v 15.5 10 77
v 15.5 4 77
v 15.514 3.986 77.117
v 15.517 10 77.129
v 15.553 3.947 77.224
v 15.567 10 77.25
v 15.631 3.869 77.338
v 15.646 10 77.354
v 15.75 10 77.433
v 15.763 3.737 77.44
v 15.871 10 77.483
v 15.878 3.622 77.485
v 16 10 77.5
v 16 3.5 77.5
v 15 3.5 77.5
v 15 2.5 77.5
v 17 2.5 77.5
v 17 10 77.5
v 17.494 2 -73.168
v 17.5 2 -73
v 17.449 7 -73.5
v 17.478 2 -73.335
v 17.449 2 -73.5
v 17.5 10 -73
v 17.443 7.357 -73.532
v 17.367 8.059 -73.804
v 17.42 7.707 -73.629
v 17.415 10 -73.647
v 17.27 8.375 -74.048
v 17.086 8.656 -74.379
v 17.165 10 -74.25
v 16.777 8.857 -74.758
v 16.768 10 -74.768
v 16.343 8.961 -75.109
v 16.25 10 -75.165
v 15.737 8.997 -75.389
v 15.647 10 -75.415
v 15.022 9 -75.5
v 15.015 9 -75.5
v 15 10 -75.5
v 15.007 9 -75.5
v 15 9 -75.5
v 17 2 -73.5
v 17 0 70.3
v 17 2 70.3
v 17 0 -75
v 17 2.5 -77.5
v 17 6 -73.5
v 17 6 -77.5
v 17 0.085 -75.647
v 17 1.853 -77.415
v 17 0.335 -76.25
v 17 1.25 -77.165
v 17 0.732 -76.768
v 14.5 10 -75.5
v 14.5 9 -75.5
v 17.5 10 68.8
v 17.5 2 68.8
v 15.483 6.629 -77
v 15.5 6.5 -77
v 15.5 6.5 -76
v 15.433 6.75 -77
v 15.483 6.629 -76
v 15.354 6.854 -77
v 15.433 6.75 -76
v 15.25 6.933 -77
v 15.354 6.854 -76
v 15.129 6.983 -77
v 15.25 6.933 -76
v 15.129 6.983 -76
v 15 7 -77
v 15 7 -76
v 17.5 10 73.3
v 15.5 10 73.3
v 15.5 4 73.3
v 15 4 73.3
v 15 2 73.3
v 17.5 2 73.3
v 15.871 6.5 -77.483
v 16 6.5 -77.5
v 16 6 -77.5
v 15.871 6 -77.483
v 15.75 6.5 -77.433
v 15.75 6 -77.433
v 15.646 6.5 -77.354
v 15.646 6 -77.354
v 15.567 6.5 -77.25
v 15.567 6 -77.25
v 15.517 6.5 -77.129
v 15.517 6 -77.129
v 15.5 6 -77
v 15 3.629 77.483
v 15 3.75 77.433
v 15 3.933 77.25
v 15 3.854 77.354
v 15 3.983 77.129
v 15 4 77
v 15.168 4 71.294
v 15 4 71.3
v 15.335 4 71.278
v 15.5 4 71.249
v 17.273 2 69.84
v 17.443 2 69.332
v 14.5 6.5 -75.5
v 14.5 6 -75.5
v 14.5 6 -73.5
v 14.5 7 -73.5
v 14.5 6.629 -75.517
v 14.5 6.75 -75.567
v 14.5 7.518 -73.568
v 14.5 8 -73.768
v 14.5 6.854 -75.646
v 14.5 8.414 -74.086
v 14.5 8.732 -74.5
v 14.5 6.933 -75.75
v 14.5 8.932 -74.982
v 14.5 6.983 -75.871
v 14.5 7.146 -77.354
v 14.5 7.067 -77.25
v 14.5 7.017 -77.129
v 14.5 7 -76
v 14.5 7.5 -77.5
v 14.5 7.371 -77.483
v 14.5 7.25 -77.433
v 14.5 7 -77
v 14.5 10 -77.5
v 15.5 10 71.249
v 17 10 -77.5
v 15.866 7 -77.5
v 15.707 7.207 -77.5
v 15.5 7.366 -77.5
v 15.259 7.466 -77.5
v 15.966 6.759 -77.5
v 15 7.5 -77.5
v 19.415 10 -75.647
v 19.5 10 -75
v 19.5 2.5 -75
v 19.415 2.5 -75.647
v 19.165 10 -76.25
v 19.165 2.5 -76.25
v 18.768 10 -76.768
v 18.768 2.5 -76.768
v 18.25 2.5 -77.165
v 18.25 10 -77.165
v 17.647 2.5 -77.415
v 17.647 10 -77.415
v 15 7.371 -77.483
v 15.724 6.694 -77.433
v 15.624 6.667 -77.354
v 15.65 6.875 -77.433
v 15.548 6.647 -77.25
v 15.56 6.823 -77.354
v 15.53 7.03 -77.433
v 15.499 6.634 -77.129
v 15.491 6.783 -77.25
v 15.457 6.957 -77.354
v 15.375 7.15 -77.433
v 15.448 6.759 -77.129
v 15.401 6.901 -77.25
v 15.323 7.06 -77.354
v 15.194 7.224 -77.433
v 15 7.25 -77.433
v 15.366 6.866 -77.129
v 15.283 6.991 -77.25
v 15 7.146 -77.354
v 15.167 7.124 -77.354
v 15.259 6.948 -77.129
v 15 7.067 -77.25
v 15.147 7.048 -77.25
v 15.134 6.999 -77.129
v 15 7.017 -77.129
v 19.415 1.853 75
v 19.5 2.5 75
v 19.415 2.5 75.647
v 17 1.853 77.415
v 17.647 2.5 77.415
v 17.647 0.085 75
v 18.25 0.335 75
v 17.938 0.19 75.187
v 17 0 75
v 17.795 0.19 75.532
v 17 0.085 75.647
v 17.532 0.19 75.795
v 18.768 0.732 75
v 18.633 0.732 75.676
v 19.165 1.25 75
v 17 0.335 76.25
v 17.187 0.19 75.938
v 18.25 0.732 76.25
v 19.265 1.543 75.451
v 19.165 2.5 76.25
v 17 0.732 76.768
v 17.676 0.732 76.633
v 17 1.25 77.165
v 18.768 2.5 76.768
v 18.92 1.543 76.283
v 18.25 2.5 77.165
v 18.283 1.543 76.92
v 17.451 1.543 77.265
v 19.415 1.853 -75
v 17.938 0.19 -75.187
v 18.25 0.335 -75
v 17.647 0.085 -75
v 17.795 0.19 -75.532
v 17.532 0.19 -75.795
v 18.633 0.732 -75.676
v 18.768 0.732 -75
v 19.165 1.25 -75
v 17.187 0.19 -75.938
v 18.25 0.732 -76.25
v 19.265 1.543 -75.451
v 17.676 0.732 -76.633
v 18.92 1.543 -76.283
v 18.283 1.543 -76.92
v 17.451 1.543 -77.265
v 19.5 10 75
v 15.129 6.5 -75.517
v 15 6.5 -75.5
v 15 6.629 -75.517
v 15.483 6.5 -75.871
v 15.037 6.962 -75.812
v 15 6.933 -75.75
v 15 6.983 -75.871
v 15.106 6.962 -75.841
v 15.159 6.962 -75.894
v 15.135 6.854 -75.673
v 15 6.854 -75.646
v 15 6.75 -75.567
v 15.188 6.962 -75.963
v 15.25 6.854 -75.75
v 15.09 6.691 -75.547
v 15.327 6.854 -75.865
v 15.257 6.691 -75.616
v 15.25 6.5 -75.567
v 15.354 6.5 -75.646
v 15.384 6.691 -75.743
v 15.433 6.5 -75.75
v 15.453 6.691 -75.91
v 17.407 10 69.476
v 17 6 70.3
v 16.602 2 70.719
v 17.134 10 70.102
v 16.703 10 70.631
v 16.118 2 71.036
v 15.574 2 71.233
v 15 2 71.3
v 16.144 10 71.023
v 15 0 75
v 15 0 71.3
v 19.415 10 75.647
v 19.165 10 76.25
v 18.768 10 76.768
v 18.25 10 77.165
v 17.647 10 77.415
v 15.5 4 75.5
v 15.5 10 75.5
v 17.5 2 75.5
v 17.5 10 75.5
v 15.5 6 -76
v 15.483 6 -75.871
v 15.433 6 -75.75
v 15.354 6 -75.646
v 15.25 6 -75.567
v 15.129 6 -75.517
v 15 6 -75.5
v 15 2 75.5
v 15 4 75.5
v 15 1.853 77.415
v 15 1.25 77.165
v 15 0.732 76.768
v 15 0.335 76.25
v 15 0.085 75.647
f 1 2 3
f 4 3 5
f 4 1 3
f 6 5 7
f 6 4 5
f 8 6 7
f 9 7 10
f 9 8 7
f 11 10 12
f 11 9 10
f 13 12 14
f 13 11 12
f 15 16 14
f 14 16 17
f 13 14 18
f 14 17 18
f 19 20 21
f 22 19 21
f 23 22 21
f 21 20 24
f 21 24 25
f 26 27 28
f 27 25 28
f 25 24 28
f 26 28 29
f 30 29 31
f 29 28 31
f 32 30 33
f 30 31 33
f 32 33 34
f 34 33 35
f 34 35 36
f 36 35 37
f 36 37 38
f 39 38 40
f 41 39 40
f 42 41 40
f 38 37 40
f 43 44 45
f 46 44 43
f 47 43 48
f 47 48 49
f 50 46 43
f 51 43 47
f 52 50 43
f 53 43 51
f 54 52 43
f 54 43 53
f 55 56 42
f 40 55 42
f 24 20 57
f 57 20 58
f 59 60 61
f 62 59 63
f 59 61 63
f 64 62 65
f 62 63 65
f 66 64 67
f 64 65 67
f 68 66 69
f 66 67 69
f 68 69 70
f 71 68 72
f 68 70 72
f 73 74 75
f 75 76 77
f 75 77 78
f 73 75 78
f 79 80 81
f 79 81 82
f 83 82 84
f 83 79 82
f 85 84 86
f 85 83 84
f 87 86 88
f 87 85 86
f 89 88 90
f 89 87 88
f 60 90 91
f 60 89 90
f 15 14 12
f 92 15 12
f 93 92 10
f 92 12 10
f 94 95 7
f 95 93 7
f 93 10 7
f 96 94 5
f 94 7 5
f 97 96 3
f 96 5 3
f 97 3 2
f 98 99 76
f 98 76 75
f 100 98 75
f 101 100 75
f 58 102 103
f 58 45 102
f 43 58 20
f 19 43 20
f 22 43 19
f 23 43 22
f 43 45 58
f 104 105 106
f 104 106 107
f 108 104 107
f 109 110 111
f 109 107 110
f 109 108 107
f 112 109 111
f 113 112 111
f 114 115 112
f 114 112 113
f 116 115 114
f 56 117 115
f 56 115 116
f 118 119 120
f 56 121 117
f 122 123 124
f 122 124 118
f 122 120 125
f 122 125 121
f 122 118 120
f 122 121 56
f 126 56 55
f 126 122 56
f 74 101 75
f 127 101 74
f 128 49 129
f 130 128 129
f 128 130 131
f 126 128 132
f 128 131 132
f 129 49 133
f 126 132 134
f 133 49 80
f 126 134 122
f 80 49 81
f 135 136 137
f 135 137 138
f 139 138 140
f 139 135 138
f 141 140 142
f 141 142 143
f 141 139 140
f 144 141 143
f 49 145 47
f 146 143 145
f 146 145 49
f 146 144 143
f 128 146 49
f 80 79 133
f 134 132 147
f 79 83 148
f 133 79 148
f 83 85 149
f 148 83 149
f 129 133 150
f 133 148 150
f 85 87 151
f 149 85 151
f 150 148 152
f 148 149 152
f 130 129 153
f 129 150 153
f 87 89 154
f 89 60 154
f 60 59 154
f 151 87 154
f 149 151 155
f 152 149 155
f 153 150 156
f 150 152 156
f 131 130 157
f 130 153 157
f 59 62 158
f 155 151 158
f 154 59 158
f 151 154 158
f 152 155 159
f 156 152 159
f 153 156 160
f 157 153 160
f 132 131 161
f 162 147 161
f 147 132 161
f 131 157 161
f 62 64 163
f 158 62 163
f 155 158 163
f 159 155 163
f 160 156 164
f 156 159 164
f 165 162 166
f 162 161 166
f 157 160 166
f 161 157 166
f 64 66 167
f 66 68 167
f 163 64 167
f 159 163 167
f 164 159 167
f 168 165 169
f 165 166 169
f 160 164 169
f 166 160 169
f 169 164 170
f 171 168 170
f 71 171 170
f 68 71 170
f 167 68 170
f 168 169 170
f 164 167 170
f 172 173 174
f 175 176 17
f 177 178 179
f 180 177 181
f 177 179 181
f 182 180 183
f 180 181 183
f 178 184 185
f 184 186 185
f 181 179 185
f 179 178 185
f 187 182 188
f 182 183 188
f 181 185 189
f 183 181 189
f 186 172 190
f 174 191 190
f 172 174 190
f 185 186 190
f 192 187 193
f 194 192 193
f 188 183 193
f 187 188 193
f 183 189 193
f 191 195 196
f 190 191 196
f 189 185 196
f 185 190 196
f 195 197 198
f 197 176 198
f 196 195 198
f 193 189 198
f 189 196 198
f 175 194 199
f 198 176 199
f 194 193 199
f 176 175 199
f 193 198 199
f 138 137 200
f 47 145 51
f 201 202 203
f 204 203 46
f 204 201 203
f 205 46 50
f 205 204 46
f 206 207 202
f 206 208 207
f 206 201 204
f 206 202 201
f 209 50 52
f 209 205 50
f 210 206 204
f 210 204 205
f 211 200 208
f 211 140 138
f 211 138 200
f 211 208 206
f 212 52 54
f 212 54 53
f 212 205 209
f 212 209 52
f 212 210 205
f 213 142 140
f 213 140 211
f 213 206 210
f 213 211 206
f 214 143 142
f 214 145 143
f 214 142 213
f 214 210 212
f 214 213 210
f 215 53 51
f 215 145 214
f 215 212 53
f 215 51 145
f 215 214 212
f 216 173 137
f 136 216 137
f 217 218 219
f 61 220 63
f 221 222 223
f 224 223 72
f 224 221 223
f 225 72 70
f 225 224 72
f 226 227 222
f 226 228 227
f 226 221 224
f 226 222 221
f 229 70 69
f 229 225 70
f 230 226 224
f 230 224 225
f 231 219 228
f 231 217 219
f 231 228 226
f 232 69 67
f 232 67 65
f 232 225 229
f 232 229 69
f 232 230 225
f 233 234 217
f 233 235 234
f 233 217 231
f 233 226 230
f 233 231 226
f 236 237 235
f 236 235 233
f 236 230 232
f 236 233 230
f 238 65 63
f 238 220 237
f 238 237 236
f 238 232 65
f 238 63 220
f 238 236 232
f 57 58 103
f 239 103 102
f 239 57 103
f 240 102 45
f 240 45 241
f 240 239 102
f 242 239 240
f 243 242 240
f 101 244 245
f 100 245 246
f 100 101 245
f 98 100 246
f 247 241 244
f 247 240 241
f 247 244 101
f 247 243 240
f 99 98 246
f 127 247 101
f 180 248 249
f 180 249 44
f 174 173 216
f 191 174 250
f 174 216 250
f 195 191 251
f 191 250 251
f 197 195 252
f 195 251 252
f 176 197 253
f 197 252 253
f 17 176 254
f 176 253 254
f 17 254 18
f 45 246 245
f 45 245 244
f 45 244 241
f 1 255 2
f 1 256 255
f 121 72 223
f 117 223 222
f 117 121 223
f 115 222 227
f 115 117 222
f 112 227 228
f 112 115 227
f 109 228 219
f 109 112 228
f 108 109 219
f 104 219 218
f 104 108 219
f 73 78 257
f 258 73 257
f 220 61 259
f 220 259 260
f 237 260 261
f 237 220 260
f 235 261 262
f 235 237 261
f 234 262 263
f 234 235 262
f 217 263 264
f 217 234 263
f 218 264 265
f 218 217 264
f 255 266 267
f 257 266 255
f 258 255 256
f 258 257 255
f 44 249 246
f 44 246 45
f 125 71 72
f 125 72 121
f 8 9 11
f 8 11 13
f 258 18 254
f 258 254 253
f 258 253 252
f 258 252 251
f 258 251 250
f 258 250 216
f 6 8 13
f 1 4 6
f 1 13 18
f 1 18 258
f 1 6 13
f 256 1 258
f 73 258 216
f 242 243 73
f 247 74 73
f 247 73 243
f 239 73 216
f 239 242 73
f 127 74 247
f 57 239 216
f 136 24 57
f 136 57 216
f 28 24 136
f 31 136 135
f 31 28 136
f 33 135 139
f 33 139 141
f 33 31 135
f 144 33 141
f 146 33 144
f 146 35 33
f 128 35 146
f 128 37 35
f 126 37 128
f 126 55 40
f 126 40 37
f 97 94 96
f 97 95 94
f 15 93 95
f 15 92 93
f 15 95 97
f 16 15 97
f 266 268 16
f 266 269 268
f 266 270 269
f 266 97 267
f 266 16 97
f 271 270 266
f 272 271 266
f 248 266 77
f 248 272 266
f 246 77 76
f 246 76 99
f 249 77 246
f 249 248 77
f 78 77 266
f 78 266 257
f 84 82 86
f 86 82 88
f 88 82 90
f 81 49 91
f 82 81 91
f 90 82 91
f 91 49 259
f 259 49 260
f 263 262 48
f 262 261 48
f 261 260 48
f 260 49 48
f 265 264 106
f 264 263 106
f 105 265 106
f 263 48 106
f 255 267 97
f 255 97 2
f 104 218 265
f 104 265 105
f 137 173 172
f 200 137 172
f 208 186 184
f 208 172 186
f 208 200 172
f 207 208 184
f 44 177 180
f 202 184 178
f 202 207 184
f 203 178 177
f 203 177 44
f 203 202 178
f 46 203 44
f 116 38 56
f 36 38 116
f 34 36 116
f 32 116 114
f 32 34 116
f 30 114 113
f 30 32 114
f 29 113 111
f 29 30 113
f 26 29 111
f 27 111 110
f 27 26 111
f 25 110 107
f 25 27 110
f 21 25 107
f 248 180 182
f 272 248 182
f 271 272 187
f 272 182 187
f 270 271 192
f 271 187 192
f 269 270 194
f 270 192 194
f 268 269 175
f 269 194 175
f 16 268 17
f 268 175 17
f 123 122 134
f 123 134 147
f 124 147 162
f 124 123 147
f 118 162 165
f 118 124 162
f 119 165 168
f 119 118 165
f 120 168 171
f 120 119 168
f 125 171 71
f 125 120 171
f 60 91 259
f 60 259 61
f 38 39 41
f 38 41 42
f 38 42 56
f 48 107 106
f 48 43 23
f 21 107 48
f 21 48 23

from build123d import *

# Parameters (mm, degrees)
SKETCH1_W                       = 39
SKETCH1_H                       = 155
BOSS_EXTRUDE1_DEPTH             = 2
BOSS_EXTRUDE2_DEPTH             = 38
SKETCH3_W                       = 2
SKETCH3_H                       = 2
BOSS_EXTRUDE3_DEPTH             = 38
SKETCH4_W                       = 2
SKETCH4_H                       = 2
BOSS_EXTRUDE4_DEPTH             = 151
SKETCH6_W                       = 35
SKETCH6_H                       = 2.2
CUT_EXTRUDE1_DEPTH              = 160.340045186
SKETCH7_W                       = 35
SKETCH7_H                       = 2.2
CUT_EXTRUDE2_DEPTH              = 89.490112442
SKETCH5_W                       = 31
SKETCH5_H                       = 2
BOSS_EXTRUDE5_DEPTH             = 2
BOSS_EXTRUDE6_REACH             = 91.367
SKETCH8_W                       = 2
SKETCH8_H                       = 2
BOSS_EXTRUDE6_DIRECTION_2_REACH = 91.367
SKETCH10_W                      = 2
SKETCH10_H                      = 2.2
SKETCH10_W_2                    = 2.2
SKETCH10_H_2                    = 2
BOSS_EXTRUDE8_DEPTH             = 2
SKETCH11_W                      = 2
SKETCH11_H                      = 2.2
SKETCH11_W_2                    = 2.2
SKETCH11_H_2                    = 2
BOSS_EXTRUDE9_DEPTH             = 2
FILLET2_R                       = 2.5
SKETCH14_W                      = 36.5
SKETCH14_H                      = 7.75
BOSS_EXTRUDE10_DEPTH            = 2
SKETCH13_W                      = 31
SKETCH13_H                      = 3
CUT_EXTRUDE4_DEPTH              = 2
FILLET3_R                       = 2
FILLET4_R                       = 0.5
SKETCH15_R                      = 5.1
CUT_EXTRUDE5_DEPTH              = 90.367219941
SKETCH16_R                      = 7.1
BOSS_EXTRUDE11_DEPTH            = 1
FILLET5_R                       = 0.5
CUT_EXTRUDE3_DEPTH              = 160.340045186
FILLET6_R                       = 0.4
FILLET7_R                       = 0.5
CUT_EXTRUDE6_DEPTH              = 6
SKETCH18_W                      = 29
SKETCH18_H                      = 3
CUT_EXTRUDE8_DEPTH              = 90.367220028
CUT_EXTRUDE11_DEPTH             = 90.367220028
CUT_EXTRUDE11_DEPTH_BACK        = 90.367220028
SKETCH20_W                      = 29
SKETCH20_H                      = 34
SKETCH21_W                      = 155
SKETCH21_H                      = 20
SKETCH21_H_2                    = 10
CUT_EXTRUDE12_DEPTH             = 90.367219941


with BuildPart() as part:
    # Sketch1 → Boss-Extrude1 (new body)
    with BuildSketch(Plane(origin=(0, 0, 0), x_dir=(1, 0, 0), z_dir=(0, 1, 0))):
        Rectangle(SKETCH1_W, SKETCH1_H)
    extrude(amount=BOSS_EXTRUDE1_DEPTH)

    # Sketch2 → Boss-Extrude2 (add)
    with BuildSketch(Plane(origin=(0, 2, 0), x_dir=(1, 0, 0), z_dir=(0, 1, 0))):
        Polygon((-17.5, -77.5), (-17.5, -75.5), (-17.5, 75.5), (17.5, 75.5), (17.5, -75.5), (17.5, -77.5), (19.5, -77.5), (19.5, 77.5), (-19.5, 77.5), (-19.5, -77.5), align=None)
    extrude(amount=BOSS_EXTRUDE2_DEPTH)

    # Sketch3 → Boss-Extrude3 (add)
    with BuildSketch(Plane(origin=(0, 2, 0), x_dir=(1, 0, 0), z_dir=(0, 1, 0))):
        with Locations((-16.5, -76.5)):
            Rectangle(SKETCH3_W, SKETCH3_H)
        with Locations((-16.5, -72.3)):
            Rectangle(SKETCH3_W, SKETCH3_H)
        with Locations((16.5, -76.5)):
            Rectangle(SKETCH3_W, SKETCH3_H)
        with Locations((16.5, -72.3)):
            Rectangle(SKETCH3_W, SKETCH3_H)
    extrude(amount=BOSS_EXTRUDE3_DEPTH)

    # Sketch4 → Boss-Extrude4 (add)
    with BuildSketch(Plane.XY.offset(-75.5)):
        with Locations((-16.5, 39)):
            Rectangle(SKETCH4_W, SKETCH4_H)
        Polygon((-15.5, 33.8), (-17.5, 31.8), (-17.5, 35.8), (-15.5, 35.8), align=None)
        Polygon((15.5, 35.8), (17.5, 35.8), (17.5, 31.8), (15.5, 33.8), align=None)
        with Locations((16.5, 39)):
            Rectangle(SKETCH4_W, SKETCH4_H)
    extrude(amount=BOSS_EXTRUDE4_DEPTH)

    # Sketch6 → Cut-Extrude1 (cut, through all)
    with BuildSketch(Plane.XY.offset(-75.5)):
        with Locations((0, 36.9)):
            Rectangle(SKETCH6_W, SKETCH6_H)
    extrude(amount=CUT_EXTRUDE1_DEPTH, mode=Mode.SUBTRACT)

    # Sketch7 → Cut-Extrude2 (cut, through all)
    with BuildSketch(Plane(origin=(0, 2, 0), x_dir=(1, 0, 0), z_dir=(0, 1, 0))):
        with Locations((0, -74.4)):
            Rectangle(SKETCH7_W, SKETCH7_H)
    extrude(amount=CUT_EXTRUDE2_DEPTH, mode=Mode.SUBTRACT)

    # Sketch5 → Boss-Extrude5 (add)
    with BuildSketch(Plane(origin=(0, 2, 0), x_dir=(1, 0, 0), z_dir=(0, 1, 0))):
        with Locations((0, -76.5)):
            Rectangle(SKETCH5_W, SKETCH5_H)
        with Locations((0, -72.3)):
            Rectangle(SKETCH5_W, SKETCH5_H)
    extrude(amount=BOSS_EXTRUDE5_DEPTH)

    # Boss-Extrude6: up to this face of the body (flat: up to its plane)
    boss_extrude6_end = Plane(part.part.faces().sort_by_distance((17.5, 16.9, -2.1))[0])
    # Sketch8 → Boss-Extrude6 (add, up to the picked face)
    with BuildSketch(Plane(origin=(0, 0, 0), x_dir=(0, 0, -1), z_dir=(1, 0, 0)), mode=Mode.PRIVATE) as boss_extrude6_sk1:
        with Locations((74.5, 39)):
            Rectangle(SKETCH8_W, SKETCH8_H)
    boss_extrude6_tool1 = split(extrude(boss_extrude6_sk1.sketch, amount=BOSS_EXTRUDE6_REACH, mode=Mode.PRIVATE), bisect_by=boss_extrude6_end, keep=Keep.BOTH, mode=Mode.PRIVATE)
    # Sketch8 → Boss-Extrude6 (add, up to the picked face)
    with BuildSketch(Plane(origin=(0, 0, 0), x_dir=(0, 0, -1), z_dir=(1, 0, 0)), mode=Mode.PRIVATE) as boss_extrude6_sk2:
        Polygon((75.5, 35.8), (73.5, 35.8), (73.5, 33.8), (75.5, 31.8), align=None)
    boss_extrude6_tool2 = split(extrude(boss_extrude6_sk2.sketch, amount=BOSS_EXTRUDE6_REACH, mode=Mode.PRIVATE), bisect_by=boss_extrude6_end, keep=Keep.BOTH, mode=Mode.PRIVATE)
    add(boss_extrude6_tool1.solids().sort_by(Axis((0, 39, -74.5), (1, 0, 0)))[0])
    add(boss_extrude6_tool2.solids().sort_by(Axis((0, 34.244444, -74.611111), (1, 0, 0)))[0])

    # Boss-Extrude6 direction 2: up to this face of the body (flat: up to its plane)
    boss_extrude6_direction_2_end = Plane(part.part.faces().sort_by_distance((-17.5, 16.9, -2.1))[0])
    # Sketch8 → Boss-Extrude6 direction 2 (add, up to the picked face)
    with BuildSketch(Plane(origin=(0, 0, 0), x_dir=(0, 0, -1), z_dir=(1, 0, 0)), mode=Mode.PRIVATE) as boss_extrude6_direction_2_sk1:
        with Locations((74.5, 39)):
            Rectangle(SKETCH8_W, SKETCH8_H)
    boss_extrude6_direction_2_tool1 = split(extrude(boss_extrude6_direction_2_sk1.sketch, amount=-BOSS_EXTRUDE6_DIRECTION_2_REACH, mode=Mode.PRIVATE), bisect_by=boss_extrude6_direction_2_end, keep=Keep.BOTH, mode=Mode.PRIVATE)
    # Sketch8 → Boss-Extrude6 direction 2 (add, up to the picked face)
    with BuildSketch(Plane(origin=(0, 0, 0), x_dir=(0, 0, -1), z_dir=(1, 0, 0)), mode=Mode.PRIVATE) as boss_extrude6_direction_2_sk2:
        Polygon((75.5, 35.8), (73.5, 35.8), (73.5, 33.8), (75.5, 31.8), align=None)
    boss_extrude6_direction_2_tool2 = split(extrude(boss_extrude6_direction_2_sk2.sketch, amount=-BOSS_EXTRUDE6_DIRECTION_2_REACH, mode=Mode.PRIVATE), bisect_by=boss_extrude6_direction_2_end, keep=Keep.BOTH, mode=Mode.PRIVATE)
    add(boss_extrude6_direction_2_tool1.solids().sort_by(Axis((0, 39, -74.5), (-1, 0, 0)))[0])
    add(boss_extrude6_direction_2_tool2.solids().sort_by(Axis((0, 34.244444, -74.611111), (-1, 0, 0)))[0])

    # Sketch10 → Boss-Extrude8 (add)
    with BuildSketch(Plane(origin=(-17.5, 0, 0), x_dir=(0, 0, -1), z_dir=(1, 0, 0))):
        with Locations((-76.5, 36.9)):
            Rectangle(SKETCH10_W, SKETCH10_H)
        with Locations((-74.4, 39)):
            Rectangle(SKETCH10_W_2, SKETCH10_H_2)
    extrude(amount=BOSS_EXTRUDE8_DEPTH)

    # Sketch11 → Boss-Extrude9 (add)
    with BuildSketch(Plane.ZY.offset(-17.5)):
        with Locations((76.5, 36.9)):
            Rectangle(SKETCH11_W, SKETCH11_H)
        with Locations((74.4, 39)):
            Rectangle(SKETCH11_W_2, SKETCH11_H_2)
    extrude(amount=BOSS_EXTRUDE9_DEPTH)

    # Fillet2
    fillet2_edges = [part.edges().sort_by_distance(p)[0] for p in [
        (-17.5, 16.9, 71.3),
        (17.5, 16.9, 71.3),
        (19.5, 20, 77.5),
        (-19.5, 20, 77.5),
        (-19.5, 20, -77.5),
        (-17.5, 16.9, -75.5),
        (17.5, 16.9, -75.5),
        (19.5, 20, -77.5),
        (19.5, 40, 0),
        (-19.5, 40, 0),
        (19.5, 0, 0),
        (-19.5, 0, 0),
        (0, 40, -77.5),
        (0, 0, 77.5),
        (0, 0, -77.5),
        (-17.5, 40, 77.5),
        (17.5, 40, 77.5),
    ]]
    fillet(fillet2_edges, radius=FILLET2_R)

    # Sketch14 → Boss-Extrude10 (add)
    with BuildSketch(Plane.XY.offset(-75.5)):
        with Locations((0, 5.125)):
            Rectangle(SKETCH14_W, SKETCH14_H)
    extrude(amount=BOSS_EXTRUDE10_DEPTH)

    # Sketch13 → Cut-Extrude4 (cut)
    with BuildSketch(Plane(origin=(0, 0, -77.5), x_dir=(-1, 0, 0), z_dir=(0, 0, -1))):
        with Locations((0, 5.5)):
            Rectangle(SKETCH13_W, SKETCH13_H)
    extrude(amount=-CUT_EXTRUDE4_DEPTH, mode=Mode.SUBTRACT)

    # Fillet3
    fillet3_edges = [part.edges().sort_by_distance(p)[0] for p in [
        (0, 9, -73.5),
    ]]
    fillet(fillet3_edges, radius=FILLET3_R - 0.0001)  # a hair under: the kernel refuses the full size

    # Fillet4
    fillet4_edges = [part.edges().sort_by_distance(p)[0] for p in [
        (15.5, 5.5, -75.5),
        (15.5, 4, -76.5),
        (0, 7, -75.5),
        (15.5, 7, -76.5),
        (-15.5, 5.5, -75.5),
        (-15.5, 7, -76.5),
        (0, 4, -75.5),
        (-15.5, 4, -76.5),
        (15.5, 5.5, -77.5),
        (0, 4, -77.5),
        (-15.5, 5.5, -77.5),
        (0, 7, -77.5),
    ]]
    fillet(fillet4_edges, radius=FILLET4_R)

    # Sketch15 → Cut-Extrude5 (cut, through all)
    with BuildSketch(Plane.XZ):
        with Locations(Location((0, 38.75, 0), (0, 0, 270))):
            Circle(SKETCH15_R)
        with Locations(Location((0, -38.75, 0), (0, 0, 270))):
            Circle(SKETCH15_R)
    extrude(amount=-CUT_EXTRUDE5_DEPTH, mode=Mode.SUBTRACT)

    # Sketch16 → Boss-Extrude11 (add)
    with BuildSketch(Plane(origin=(0, 2, 0), x_dir=(1, 0, 0), z_dir=(0, 1, 0))):
        with Locations(Location((0, 38.75, 0), (0, 0, 270))):
            Circle(SKETCH16_R)
        with Locations(Location((0, -38.75, 0), (0, 0, 270))):
            Circle(SKETCH16_R)
    extrude(amount=BOSS_EXTRUDE11_DEPTH)

    # Fillet5
    fillet5_edges = [part.edges().sort_by_distance(p)[0] for p in [
        (0, 2, -45.85),
        (0, 3, -45.85),
        (0, 2, 31.65),
        (0, 3, 31.65),
    ]]
    fillet(fillet5_edges, radius=FILLET5_R - 0.0001)  # a hair under: the kernel refuses the full size

    # Sketch12 → Cut-Extrude3 (cut, through all)
    with BuildSketch(Plane.XY.offset(-75.5)):
        with BuildLine():
            Line((1.668907005, 12.688040659), (2.22520934, 10.250720878))
            ThreePointArc((2.22520934, 10.250720878), (4.338837391, 10.990311321), (6.234898019, 12.181685175))
            Line((6.234898019, 12.181685175), (4.676173514, 14.136263881))
            ThreePointArc((4.676173514, 14.136263881), (3.254128043, 13.242733491), (1.668907005, 12.688040659))
        make_face()
        with BuildLine():
            ThreePointArc((-6.234898019, 12.181685175), (-4.338837391, 10.990311321), (-2.22520934, 10.250720878))
            Line((-2.22520934, 10.250720878), (-1.668907005, 12.688040659))
            ThreePointArc((-1.668907005, 12.688040659), (-3.254128043, 13.242733491), (-4.676173514, 14.136263881))
            Line((-4.676173514, 14.136263881), (-6.234898019, 12.181685175))
        make_face()
        with BuildLine():
            ThreePointArc((-10, 20), (-9.749279122, 17.77479066), (-9.009688679, 15.661162609))
            Line((-9.009688679, 15.661162609), (-6.757266509, 16.745871957))
            ThreePointArc((-6.757266509, 16.745871957), (-7.311959341, 18.331092995), (-7.5, 20))
            Line((-7.5, 20), (-10, 20))
        make_face()
        with BuildLine():
            ThreePointArc((-6.234898019, 27.818314825), (-7.818314825, 26.234898019), (-9.009688679, 24.338837391))
            Line((-9.009688679, 24.338837391), (-6.757266509, 23.254128043))
            ThreePointArc((-6.757266509, 23.254128043), (-5.863736119, 24.676173514), (-4.676173514, 25.863736119))
            Line((-4.676173514, 25.863736119), (-6.234898019, 27.818314825))
        make_face()
        with BuildLine():
            ThreePointArc((-1.668907005, 27.311959341), (-0.839733571, 27.452841574), (0, 27.5))
            Line((0, 27.5), (0, 30))
            ThreePointArc((0, 30), (-1.119644761, 29.937122099), (-2.22520934, 29.749279122))
            Line((-2.22520934, 29.749279122), (-1.668907005, 27.311959341))
        make_face()
        with BuildLine():
            Line((0, 30), (0, 27.5))
            ThreePointArc((0, 27.5), (0.839733571, 27.452841574), (1.668907005, 27.311959341))
            Line((1.668907005, 27.311959341), (2.22520934, 29.749279122))
            ThreePointArc((2.22520934, 29.749279122), (1.119644761, 29.937122099), (0, 30))
        make_face()
        with BuildLine():
            Line((6.757266509, 23.254128043), (9.009688679, 24.338837391))
            ThreePointArc((9.009688679, 24.338837391), (7.818314825, 26.234898019), (6.234898019, 27.818314825))
            Line((6.234898019, 27.818314825), (4.676173514, 25.863736119))
            ThreePointArc((4.676173514, 25.863736119), (5.863736119, 24.676173514), (6.757266509, 23.254128043))
        make_face()
        with BuildLine():
            Line((6.757266509, 16.745871957), (9.009688679, 15.661162609))
            ThreePointArc((9.009688679, 15.661162609), (9.749279122, 17.77479066), (10, 20))
            Line((10, 20), (7.5, 20))
            ThreePointArc((7.5, 20), (7.311959341, 18.331092995), (6.757266509, 16.745871957))
        make_face()
        with BuildLine():
            ThreePointArc((2.5, 20), (2.43731978, 19.443697665), (2.25242217, 18.915290652))
            Line((2.25242217, 18.915290652), (4.50484434, 17.830581304))
            ThreePointArc((4.50484434, 17.830581304), (4.874639561, 18.88739533), (5, 20))
            Line((5, 20), (2.5, 20))
        make_face()
        with BuildLine():
            ThreePointArc((1.558724505, 21.954578706), (1.954578706, 21.558724505), (2.25242217, 21.084709348))
            Line((2.25242217, 21.084709348), (4.50484434, 22.169418696))
            ThreePointArc((4.50484434, 22.169418696), (3.909157412, 23.117449009), (3.117449009, 23.909157412))
            Line((3.117449009, 23.909157412), (1.558724505, 21.954578706))
        make_face()
        with BuildLine():
            Line((0, 25), (0, 22.5))
            ThreePointArc((0, 22.5), (0.27991119, 22.484280525), (0.556302335, 22.43731978))
            Line((0.556302335, 22.43731978), (1.11260467, 24.874639561))
            ThreePointArc((1.11260467, 24.874639561), (0.559822381, 24.968561049), (0, 25))
        make_face()
        with BuildLine():
            ThreePointArc((-0.556302335, 22.43731978), (-0.27991119, 22.484280525), (0, 22.5))
            Line((0, 22.5), (0, 25))
            ThreePointArc((0, 25), (-0.559822381, 24.968561049), (-1.11260467, 24.874639561))
            Line((-1.11260467, 24.874639561), (-0.556302335, 22.43731978))
        make_face()
        with BuildLine():
            ThreePointArc((-2.25242217, 21.084709348), (-1.954578706, 21.558724505), (-1.558724505, 21.954578706))
            Line((-1.558724505, 21.954578706), (-3.117449009, 23.909157412))
            ThreePointArc((-3.117449009, 23.909157412), (-3.909157412, 23.117449009), (-4.50484434, 22.169418696))
            Line((-4.50484434, 22.169418696), (-2.25242217, 21.084709348))
        make_face()
        with BuildLine():
            ThreePointArc((-2.25242217, 18.915290652), (-2.43731978, 19.443697665), (-2.5, 20))
            Line((-2.5, 20), (-5, 20))
            ThreePointArc((-5, 20), (-4.874639561, 18.88739533), (-4.50484434, 17.830581304))
            Line((-4.50484434, 17.830581304), (-2.25242217, 18.915290652))
        make_face()
        with BuildLine():
            ThreePointArc((-3.117449009, 16.090842588), (-2.169418696, 15.49515566), (-1.11260467, 15.125360439))
            Line((-1.11260467, 15.125360439), (-0.556302335, 17.56268022))
            ThreePointArc((-0.556302335, 17.56268022), (-1.084709348, 17.74757783), (-1.558724505, 18.045421294))
            Line((-1.558724505, 18.045421294), (-3.117449009, 16.090842588))
        make_face()
        with BuildLine():
            Line((0.556302335, 17.56268022), (1.11260467, 15.125360439))
            ThreePointArc((1.11260467, 15.125360439), (2.169418696, 15.49515566), (3.117449009, 16.090842588))
            Line((3.117449009, 16.090842588), (1.558724505, 18.045421294))
            ThreePointArc((1.558724505, 18.045421294), (1.084709348, 17.74757783), (0.556302335, 17.56268022))
        make_face()
    extrude(amount=-CUT_EXTRUDE3_DEPTH, mode=Mode.SUBTRACT)

    # Fillet6
    fillet6_edges = [part.edges().sort_by_distance(p)[0] for p in [
        (5.863736119, 24.676173514, -75.5),
        (5.455535766, 26.841025472, -75.5),
        (7.818314825, 26.234898019, -77.5),
        (7.883477594, 23.796482717, -77.5),
        (5.863736119, 24.676173514, -77.5),
        (5.455535766, 26.841025472, -77.5),
        (7.883477594, 23.796482717, -75.5),
        (7.818314825, 26.234898019, -75.5),
        (7.311959341, 18.331092995, -75.5),
        (8.75, 20, -75.5),
        (9.749279122, 17.77479066, -77.5),
        (7.883477594, 16.203517283, -77.5),
        (7.311959341, 18.331092995, -77.5),
        (8.75, 20, -77.5),
        (7.883477594, 16.203517283, -75.5),
        (9.749279122, 17.77479066, -75.5),
        (2.43731978, 19.443697665, -75.5),
        (3.75, 20, -75.5),
        (4.874639561, 18.88739533, -77.5),
        (3.378633255, 18.372935978, -77.5),
        (2.43731978, 19.443697665, -77.5),
        (3.75, 20, -77.5),
        (3.378633255, 18.372935978, -75.5),
        (4.874639561, 18.88739533, -75.5),
        (1.954578706, 21.558724505, -75.5),
        (2.338086757, 22.931868059, -75.5),
        (3.909157412, 23.117449009, -77.5),
        (3.378633255, 21.627064022, -77.5),
        (1.954578706, 21.558724505, -77.5),
        (2.338086757, 22.931868059, -77.5),
        (3.378633255, 21.627064022, -75.5),
        (3.909157412, 23.117449009, -75.5),
        (0, 27.5, -75.5),
        (-1.947058172, 28.530619232, -75.5),
        (0, 30, -77.5),
        (1.947058172, 28.530619232, -77.5),
        (0, 27.5, -77.5),
        (-1.947058172, 28.530619232, -77.5),
        (1.947058172, 28.530619232, -75.5),
        (0, 30, -75.5),
        (-5.863736119, 24.676173514, -75.5),
        (-7.883477594, 23.796482717, -75.5),
        (-7.818314825, 26.234898019, -77.5),
        (-5.455535766, 26.841025472, -77.5),
        (-5.863736119, 24.676173514, -77.5),
        (-7.883477594, 23.796482717, -77.5),
        (-5.455535766, 26.841025472, -75.5),
        (-7.818314825, 26.234898019, -75.5),
        (-7.311959341, 18.331092995, -75.5),
        (-7.883477594, 16.203517283, -75.5),
        (-9.749279122, 17.77479066, -77.5),
        (-8.75, 20, -77.5),
        (-7.311959341, 18.331092995, -77.5),
        (-7.883477594, 16.203517283, -77.5),
        (-8.75, 20, -75.5),
        (-9.749279122, 17.77479066, -75.5),
        (-3.254128043, 13.242733491, -75.5),
        (-1.947058172, 11.469380768, -75.5),
        (-4.338837391, 10.990311321, -77.5),
        (-5.455535766, 13.158974528, -77.5),
        (-3.254128043, 13.242733491, -77.5),
        (-1.947058172, 11.469380768, -77.5),
        (-5.455535766, 13.158974528, -75.5),
        (-4.338837391, 10.990311321, -75.5),
        (1.084709348, 17.74757783, -75.5),
        (2.338086757, 17.068131941, -75.5),
        (2.169418696, 15.49515566, -77.5),
        (0.834453502, 16.344020329, -77.5),
        (1.084709348, 17.74757783, -77.5),
        (2.338086757, 17.068131941, -77.5),
        (0.834453502, 16.344020329, -75.5),
        (2.169418696, 15.49515566, -75.5),
        (-2.43731978, 19.443697665, -75.5),
        (-3.378633255, 18.372935978, -75.5),
        (-4.874639561, 18.88739533, -77.5),
        (-3.75, 20, -77.5),
        (-2.43731978, 19.443697665, -77.5),
        (-3.378633255, 18.372935978, -77.5),
        (-3.75, 20, -75.5),
        (-4.874639561, 18.88739533, -75.5),
        (-1.084709348, 17.74757783, -75.5),
        (-0.834453502, 16.344020329, -75.5),
        (-2.169418696, 15.49515566, -77.5),
        (-2.338086757, 17.068131941, -77.5),
        (-1.084709348, 17.74757783, -77.5),
        (-0.834453502, 16.344020329, -77.5),
        (-2.338086757, 17.068131941, -75.5),
        (-2.169418696, 15.49515566, -75.5),
        (-1.954578706, 21.558724505, -75.5),
        (-3.378633255, 21.627064022, -75.5),
        (-3.909157412, 23.117449009, -77.5),
        (-2.338086757, 22.931868059, -77.5),
        (-1.954578706, 21.558724505, -77.5),
        (-3.378633255, 21.627064022, -77.5),
        (-2.338086757, 22.931868059, -75.5),
        (-3.909157412, 23.117449009, -75.5),
        (0, 25, -77.5),
        (0.834453502, 23.655979671, -77.5),
        (0, 22.5, -75.5),
        (-0.834453502, 23.655979671, -75.5),
        (0, 22.5, -77.5),
        (-0.834453502, 23.655979671, -77.5),
        (0, 25, -75.5),
        (0.834453502, 23.655979671, -75.5),
        (3.254128043, 13.242733491, -75.5),
        (5.455535766, 13.158974528, -75.5),
        (4.338837391, 10.990311321, -77.5),
        (1.947058172, 11.469380768, -77.5),
        (3.254128043, 13.242733491, -77.5),
        (5.455535766, 13.158974528, -77.5),
        (1.947058172, 11.469380768, -75.5),
        (4.338837391, 10.990311321, -75.5),
    ]]
    fillet(fillet6_edges, radius=FILLET6_R)

    # Fillet7
    fillet7_edges = [part.edges().sort_by_distance(p)[0] for p in [
        (15.5, 40, 0.75),
        (0, 4, 77.5),
        (0, 40, -73.5),
        (-15.5, 40, 0.75),
        (-15.5, 20.75, 77.5),
        (-15.5, 39.267766953, 76.767766953),
        (15.5, 20.75, 77.5),
        (15.5, 39.267766953, 76.767766953),
    ]]
    fillet(fillet7_edges, radius=FILLET7_R)

    # Sketch17 → Cut-Extrude6 (cut)
    with BuildSketch(Plane.XZ):
        Polygon((-17, -77.5), (-17, 70.299999999), (-14.999999999, 71.3), (-14.999999999, 77.5), (14.999999999, 77.5), (14.999999999, 71.3), (17, 70.299999999), (17, -77.5), align=None)
    extrude(amount=-CUT_EXTRUDE6_DEPTH, mode=Mode.SUBTRACT)

    # Sketch18 → Cut-Extrude8 (cut, through all)
    with BuildSketch(Plane.XY):
        with Locations((0, 7.5)):
            Rectangle(SKETCH18_W, SKETCH18_H)
    extrude(amount=-CUT_EXTRUDE8_DEPTH, mode=Mode.SUBTRACT)

    # Sketch20 → Cut-Extrude11 (cut, two sides: drawn at the far end of the back side and taken through both)
    with BuildSketch(Plane.XY.offset(-CUT_EXTRUDE11_DEPTH_BACK)):
        with Locations((0, 23)):
            Rectangle(SKETCH20_W, SKETCH20_H)
    extrude(amount=CUT_EXTRUDE11_DEPTH + CUT_EXTRUDE11_DEPTH_BACK, mode=Mode.SUBTRACT)


with BuildPart() as body_2:
    # of the pieces the cut leaves, the one that is kept (cut_extrude11_keep)
    add(part.part.solids().sort_by_distance((14.5, 40, -75))[0])

    # Sketch21 → Cut-Extrude12 (cut, through all)
    with BuildSketch(Plane(origin=(0, 0, 0), x_dir=(0, 0, -1), z_dir=(1, 0, 0))):
        with Locations((0, 20)):
            Rectangle(SKETCH21_W, SKETCH21_H)
        with Locations((0, 35)):
            Rectangle(SKETCH21_W, SKETCH21_H_2)
    extrude(amount=CUT_EXTRUDE12_DEPTH, mode=Mode.SUBTRACT)


solid = body_2.part
